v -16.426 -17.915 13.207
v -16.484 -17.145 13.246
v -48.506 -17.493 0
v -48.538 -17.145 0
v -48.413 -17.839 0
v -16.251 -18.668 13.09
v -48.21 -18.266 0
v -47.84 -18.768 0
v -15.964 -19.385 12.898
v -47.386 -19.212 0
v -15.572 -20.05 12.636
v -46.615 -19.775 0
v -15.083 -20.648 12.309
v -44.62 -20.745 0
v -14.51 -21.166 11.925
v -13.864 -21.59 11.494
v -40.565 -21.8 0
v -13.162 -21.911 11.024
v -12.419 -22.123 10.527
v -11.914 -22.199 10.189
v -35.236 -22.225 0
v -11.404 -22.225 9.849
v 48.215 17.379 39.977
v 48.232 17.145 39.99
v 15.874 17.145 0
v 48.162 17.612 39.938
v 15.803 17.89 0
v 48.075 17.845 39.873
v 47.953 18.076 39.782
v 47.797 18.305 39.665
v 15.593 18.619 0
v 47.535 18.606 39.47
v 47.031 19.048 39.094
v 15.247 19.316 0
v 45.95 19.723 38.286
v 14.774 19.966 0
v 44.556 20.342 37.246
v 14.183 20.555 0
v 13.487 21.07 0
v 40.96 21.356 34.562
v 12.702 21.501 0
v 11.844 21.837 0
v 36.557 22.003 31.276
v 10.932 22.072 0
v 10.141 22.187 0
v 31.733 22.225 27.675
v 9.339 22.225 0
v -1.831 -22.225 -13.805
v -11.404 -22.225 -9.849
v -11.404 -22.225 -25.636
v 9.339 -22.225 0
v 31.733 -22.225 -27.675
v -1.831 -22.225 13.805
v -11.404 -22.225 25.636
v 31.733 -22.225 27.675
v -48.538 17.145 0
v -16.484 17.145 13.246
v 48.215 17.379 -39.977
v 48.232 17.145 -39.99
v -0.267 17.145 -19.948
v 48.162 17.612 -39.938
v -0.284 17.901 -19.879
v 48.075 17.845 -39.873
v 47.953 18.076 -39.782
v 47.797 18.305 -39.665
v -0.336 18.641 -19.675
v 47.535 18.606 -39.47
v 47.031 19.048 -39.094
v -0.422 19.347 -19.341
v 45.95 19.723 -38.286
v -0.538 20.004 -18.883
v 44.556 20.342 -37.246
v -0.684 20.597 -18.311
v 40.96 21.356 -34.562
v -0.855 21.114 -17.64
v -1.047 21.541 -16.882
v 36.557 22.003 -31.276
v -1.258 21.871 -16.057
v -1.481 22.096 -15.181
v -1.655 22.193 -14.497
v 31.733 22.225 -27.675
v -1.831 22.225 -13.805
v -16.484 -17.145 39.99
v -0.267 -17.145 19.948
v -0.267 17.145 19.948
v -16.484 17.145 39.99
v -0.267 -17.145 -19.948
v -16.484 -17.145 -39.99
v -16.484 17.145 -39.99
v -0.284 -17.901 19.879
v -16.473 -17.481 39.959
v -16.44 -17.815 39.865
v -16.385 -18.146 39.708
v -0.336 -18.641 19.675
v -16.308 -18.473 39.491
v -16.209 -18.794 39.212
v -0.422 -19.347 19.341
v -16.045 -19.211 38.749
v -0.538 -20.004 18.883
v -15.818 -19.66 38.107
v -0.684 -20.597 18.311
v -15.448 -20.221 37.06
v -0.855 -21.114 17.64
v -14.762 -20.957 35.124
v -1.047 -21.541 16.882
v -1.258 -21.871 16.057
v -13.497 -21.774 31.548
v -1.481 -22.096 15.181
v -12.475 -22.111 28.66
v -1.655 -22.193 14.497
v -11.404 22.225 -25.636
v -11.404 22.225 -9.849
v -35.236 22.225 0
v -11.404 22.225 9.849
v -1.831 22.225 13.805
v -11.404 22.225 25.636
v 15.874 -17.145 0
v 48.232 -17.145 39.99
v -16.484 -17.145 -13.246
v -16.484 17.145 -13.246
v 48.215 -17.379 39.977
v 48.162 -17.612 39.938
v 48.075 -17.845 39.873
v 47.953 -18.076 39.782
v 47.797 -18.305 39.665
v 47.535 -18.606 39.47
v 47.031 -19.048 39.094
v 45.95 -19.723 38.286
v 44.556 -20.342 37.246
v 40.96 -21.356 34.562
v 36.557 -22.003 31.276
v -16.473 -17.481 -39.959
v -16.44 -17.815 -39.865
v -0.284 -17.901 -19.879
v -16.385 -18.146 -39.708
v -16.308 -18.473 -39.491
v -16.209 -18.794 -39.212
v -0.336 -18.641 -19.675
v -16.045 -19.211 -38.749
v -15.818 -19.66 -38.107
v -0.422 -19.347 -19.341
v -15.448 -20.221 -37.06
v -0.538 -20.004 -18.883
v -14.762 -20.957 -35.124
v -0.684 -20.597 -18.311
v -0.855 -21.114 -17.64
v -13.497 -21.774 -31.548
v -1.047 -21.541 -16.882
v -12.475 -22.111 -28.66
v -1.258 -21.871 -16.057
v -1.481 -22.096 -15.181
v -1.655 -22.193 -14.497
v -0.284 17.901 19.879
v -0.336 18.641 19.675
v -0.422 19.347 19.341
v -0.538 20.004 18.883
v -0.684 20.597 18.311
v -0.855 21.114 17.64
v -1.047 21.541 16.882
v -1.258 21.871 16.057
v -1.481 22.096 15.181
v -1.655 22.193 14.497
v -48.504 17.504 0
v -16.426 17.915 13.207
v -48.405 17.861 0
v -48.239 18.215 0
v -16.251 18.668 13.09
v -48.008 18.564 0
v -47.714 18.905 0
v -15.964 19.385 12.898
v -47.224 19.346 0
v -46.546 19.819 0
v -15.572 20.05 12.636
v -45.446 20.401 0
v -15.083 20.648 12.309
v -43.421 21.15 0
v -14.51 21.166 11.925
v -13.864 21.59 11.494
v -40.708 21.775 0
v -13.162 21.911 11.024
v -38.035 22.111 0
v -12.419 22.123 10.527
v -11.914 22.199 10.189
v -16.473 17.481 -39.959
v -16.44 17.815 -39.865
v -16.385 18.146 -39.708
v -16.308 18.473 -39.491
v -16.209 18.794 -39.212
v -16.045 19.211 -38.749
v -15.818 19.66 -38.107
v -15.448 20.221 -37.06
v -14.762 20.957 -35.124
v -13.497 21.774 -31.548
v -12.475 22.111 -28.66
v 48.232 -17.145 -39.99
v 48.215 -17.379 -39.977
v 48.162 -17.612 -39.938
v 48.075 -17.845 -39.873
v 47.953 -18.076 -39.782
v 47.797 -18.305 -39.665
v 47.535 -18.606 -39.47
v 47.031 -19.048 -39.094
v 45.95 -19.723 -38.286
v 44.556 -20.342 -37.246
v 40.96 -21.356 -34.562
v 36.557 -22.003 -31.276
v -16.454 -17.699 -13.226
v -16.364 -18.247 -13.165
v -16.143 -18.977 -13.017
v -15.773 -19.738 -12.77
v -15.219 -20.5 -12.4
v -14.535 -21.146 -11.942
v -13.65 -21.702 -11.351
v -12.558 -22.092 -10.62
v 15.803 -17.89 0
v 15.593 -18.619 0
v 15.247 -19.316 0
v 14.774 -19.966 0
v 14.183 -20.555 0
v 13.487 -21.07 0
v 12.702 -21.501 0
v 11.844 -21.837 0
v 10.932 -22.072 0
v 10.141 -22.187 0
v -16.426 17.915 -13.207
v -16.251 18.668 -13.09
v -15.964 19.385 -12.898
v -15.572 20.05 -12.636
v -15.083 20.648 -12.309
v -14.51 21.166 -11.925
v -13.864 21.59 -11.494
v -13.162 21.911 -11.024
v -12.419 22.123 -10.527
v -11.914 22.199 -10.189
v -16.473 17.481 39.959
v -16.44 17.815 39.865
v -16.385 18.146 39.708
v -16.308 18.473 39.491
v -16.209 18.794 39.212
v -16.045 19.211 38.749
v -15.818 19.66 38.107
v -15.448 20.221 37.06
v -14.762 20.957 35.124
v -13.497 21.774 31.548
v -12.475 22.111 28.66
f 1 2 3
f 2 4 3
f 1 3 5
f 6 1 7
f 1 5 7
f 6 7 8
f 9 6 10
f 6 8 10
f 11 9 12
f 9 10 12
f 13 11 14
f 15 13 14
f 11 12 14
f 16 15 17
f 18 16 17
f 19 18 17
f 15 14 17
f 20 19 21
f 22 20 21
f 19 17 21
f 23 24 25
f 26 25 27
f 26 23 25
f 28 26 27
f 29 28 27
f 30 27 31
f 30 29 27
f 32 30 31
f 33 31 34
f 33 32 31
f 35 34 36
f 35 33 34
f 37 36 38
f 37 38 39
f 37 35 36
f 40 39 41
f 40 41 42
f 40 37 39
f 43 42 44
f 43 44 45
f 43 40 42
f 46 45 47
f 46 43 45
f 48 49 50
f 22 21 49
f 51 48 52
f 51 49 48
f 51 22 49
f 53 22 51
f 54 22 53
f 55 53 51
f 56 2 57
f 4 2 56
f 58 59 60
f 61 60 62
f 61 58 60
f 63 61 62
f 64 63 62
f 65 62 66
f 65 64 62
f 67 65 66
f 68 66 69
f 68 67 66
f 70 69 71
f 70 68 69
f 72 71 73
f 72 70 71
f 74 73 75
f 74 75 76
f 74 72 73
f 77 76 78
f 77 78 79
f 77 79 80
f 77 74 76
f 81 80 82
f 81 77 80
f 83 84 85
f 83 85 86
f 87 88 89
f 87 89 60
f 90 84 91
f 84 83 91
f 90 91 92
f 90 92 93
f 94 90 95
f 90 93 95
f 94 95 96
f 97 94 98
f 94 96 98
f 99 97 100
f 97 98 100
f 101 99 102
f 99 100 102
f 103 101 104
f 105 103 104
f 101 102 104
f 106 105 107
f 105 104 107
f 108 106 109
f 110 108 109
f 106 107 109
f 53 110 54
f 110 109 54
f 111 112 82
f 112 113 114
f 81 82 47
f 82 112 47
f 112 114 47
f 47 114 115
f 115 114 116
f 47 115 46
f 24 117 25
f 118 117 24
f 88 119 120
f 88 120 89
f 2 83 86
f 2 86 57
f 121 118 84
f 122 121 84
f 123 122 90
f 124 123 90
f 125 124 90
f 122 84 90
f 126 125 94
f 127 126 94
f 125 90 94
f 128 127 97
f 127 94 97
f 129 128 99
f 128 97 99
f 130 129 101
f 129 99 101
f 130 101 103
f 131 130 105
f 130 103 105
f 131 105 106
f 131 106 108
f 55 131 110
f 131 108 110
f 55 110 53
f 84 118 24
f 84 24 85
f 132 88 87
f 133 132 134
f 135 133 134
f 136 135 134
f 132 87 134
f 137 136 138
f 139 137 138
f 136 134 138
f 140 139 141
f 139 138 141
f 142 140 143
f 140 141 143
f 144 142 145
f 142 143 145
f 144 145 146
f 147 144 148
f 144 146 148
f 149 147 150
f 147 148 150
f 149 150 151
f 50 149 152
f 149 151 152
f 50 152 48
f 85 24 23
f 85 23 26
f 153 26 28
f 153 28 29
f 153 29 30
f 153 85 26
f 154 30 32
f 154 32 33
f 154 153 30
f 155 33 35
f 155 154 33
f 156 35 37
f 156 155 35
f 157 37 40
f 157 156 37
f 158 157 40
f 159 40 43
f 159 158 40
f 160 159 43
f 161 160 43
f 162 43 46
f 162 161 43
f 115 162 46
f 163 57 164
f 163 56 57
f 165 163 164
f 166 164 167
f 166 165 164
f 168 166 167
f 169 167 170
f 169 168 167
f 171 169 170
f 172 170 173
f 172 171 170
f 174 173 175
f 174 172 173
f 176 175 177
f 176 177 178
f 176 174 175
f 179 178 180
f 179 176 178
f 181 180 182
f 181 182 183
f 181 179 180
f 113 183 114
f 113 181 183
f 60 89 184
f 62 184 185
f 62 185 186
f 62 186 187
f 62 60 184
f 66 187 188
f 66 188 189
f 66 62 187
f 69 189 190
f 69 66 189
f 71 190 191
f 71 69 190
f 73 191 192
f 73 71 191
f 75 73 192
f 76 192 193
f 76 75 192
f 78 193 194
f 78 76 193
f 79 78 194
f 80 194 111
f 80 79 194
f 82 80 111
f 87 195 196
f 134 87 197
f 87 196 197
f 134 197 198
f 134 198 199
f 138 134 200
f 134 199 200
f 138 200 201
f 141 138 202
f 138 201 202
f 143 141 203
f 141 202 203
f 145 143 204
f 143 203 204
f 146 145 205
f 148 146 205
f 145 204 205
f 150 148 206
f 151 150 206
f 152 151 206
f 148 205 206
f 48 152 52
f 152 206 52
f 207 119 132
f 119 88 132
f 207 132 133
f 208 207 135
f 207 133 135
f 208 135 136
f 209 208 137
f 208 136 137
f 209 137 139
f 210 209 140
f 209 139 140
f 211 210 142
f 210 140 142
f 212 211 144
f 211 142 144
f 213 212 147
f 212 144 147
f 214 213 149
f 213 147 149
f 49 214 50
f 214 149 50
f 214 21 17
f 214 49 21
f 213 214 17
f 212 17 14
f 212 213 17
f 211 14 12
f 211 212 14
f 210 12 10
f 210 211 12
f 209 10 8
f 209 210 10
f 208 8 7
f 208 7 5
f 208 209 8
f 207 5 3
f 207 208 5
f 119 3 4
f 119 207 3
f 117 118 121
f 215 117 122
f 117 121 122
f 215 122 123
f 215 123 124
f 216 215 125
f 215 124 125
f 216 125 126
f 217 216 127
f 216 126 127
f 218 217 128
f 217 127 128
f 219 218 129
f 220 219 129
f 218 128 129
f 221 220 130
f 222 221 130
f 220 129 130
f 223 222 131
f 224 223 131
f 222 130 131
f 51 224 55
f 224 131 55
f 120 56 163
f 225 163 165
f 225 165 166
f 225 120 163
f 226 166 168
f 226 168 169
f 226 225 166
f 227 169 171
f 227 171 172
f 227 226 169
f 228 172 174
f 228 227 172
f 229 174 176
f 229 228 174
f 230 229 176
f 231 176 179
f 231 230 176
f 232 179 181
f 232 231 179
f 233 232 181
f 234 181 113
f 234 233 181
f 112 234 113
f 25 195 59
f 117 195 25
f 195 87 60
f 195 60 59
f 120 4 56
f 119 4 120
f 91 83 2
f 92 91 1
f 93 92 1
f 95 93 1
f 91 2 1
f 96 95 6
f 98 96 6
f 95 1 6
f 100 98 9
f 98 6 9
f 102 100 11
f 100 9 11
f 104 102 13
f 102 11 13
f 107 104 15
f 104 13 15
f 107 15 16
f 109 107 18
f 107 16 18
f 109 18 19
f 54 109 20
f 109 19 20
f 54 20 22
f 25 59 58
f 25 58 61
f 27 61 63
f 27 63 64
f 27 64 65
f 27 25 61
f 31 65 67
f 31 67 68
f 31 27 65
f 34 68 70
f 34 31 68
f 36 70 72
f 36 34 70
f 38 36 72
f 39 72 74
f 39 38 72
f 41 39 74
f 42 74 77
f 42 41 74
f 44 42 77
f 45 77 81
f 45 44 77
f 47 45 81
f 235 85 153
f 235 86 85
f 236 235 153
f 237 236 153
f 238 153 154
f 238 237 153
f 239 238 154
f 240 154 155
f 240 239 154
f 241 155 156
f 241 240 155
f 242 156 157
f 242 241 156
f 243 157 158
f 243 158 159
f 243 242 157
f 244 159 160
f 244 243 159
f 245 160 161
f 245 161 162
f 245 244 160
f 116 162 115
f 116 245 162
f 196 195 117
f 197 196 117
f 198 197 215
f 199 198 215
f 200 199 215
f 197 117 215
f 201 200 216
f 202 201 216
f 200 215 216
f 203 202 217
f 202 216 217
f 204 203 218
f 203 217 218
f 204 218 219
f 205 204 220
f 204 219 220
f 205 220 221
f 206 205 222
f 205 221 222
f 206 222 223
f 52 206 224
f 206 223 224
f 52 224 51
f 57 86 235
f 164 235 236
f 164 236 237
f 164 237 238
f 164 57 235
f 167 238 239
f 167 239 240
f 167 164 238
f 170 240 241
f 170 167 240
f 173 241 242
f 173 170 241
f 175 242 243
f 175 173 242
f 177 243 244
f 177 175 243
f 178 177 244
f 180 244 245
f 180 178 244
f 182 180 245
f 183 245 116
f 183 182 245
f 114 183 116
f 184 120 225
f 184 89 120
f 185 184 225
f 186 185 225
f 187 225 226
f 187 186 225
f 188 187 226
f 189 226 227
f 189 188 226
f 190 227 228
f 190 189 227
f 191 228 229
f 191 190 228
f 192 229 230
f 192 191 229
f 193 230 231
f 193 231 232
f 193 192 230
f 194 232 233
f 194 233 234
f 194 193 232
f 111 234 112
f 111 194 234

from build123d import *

# Parameters (mm, degrees)
F1_DEPTH = 22.225
F2_R     = 5.08


with BuildPart() as f1:
    # F0 (on Front) → F1 (new body, symmetric)
    with BuildSketch(Plane.XZ):
        Polygon((-0.2670160154, 19.9477417592), (-16.4844337851, 13.2459064213), (-16.4844337851, -13.2459064213), (-0.2670160154, -19.9477417592), (15.87390434, 0), align=None)
        Polygon((-16.4844337851, 13.2459064213), (-48.5375039279, 0), (-16.4844337851, -13.2459064213), align=None)
        Polygon((-16.4844337851, 39.9900227785), (-16.4844337851, 13.2459064213), (-0.2670160154, 19.9477417592), align=None)
        Polygon((48.232242465, 39.9900227785), (-0.2670160154, 19.9477417592), (15.87390434, 0), align=None)
        Polygon((15.87390434, 0), (-0.2670160154, -19.9477417592), (48.232242465, -39.9900227785), align=None)
        Polygon((-0.2670160154, -19.9477417592), (-16.4844337851, -13.2459064213), (-16.4844337851, -39.9900227785), align=None)
    extrude(amount=F1_DEPTH, both=True)

    # F2
    f2_edges = [f1.edges().sort_by_distance(p)[0] for p in [
        (-32.510969, -22.225, -6.622953),
        (-16.484434, -22.225, -26.617965),
        (-8.375725, -22.225, -29.968882),
        (23.982613, -22.225, -29.968882),
        (32.053073, -22.225, -19.995011),
        (32.053073, -22.225, 19.995011),
        (23.982613, -22.225, 29.968882),
        (-8.375725, -22.225, 29.968882),
        (-16.484434, -22.225, 26.617965),
        (-32.510969, -22.225, 6.622953),
        (-32.510969, 22.225, 6.622953),
        (-16.484434, 22.225, 26.617965),
        (-8.375725, 22.225, 29.968882),
        (23.982613, 22.225, 29.968882),
        (32.053073, 22.225, 19.995011),
        (32.053073, 22.225, -19.995011),
        (23.982613, 22.225, -29.968882),
        (-8.375725, 22.225, -29.968882),
        (-16.484434, 22.225, -26.617965),
        (-32.510969, 22.225, -6.622953),
    ]]
    fillet(f2_edges, radius=F2_R)


solid = f1.part
